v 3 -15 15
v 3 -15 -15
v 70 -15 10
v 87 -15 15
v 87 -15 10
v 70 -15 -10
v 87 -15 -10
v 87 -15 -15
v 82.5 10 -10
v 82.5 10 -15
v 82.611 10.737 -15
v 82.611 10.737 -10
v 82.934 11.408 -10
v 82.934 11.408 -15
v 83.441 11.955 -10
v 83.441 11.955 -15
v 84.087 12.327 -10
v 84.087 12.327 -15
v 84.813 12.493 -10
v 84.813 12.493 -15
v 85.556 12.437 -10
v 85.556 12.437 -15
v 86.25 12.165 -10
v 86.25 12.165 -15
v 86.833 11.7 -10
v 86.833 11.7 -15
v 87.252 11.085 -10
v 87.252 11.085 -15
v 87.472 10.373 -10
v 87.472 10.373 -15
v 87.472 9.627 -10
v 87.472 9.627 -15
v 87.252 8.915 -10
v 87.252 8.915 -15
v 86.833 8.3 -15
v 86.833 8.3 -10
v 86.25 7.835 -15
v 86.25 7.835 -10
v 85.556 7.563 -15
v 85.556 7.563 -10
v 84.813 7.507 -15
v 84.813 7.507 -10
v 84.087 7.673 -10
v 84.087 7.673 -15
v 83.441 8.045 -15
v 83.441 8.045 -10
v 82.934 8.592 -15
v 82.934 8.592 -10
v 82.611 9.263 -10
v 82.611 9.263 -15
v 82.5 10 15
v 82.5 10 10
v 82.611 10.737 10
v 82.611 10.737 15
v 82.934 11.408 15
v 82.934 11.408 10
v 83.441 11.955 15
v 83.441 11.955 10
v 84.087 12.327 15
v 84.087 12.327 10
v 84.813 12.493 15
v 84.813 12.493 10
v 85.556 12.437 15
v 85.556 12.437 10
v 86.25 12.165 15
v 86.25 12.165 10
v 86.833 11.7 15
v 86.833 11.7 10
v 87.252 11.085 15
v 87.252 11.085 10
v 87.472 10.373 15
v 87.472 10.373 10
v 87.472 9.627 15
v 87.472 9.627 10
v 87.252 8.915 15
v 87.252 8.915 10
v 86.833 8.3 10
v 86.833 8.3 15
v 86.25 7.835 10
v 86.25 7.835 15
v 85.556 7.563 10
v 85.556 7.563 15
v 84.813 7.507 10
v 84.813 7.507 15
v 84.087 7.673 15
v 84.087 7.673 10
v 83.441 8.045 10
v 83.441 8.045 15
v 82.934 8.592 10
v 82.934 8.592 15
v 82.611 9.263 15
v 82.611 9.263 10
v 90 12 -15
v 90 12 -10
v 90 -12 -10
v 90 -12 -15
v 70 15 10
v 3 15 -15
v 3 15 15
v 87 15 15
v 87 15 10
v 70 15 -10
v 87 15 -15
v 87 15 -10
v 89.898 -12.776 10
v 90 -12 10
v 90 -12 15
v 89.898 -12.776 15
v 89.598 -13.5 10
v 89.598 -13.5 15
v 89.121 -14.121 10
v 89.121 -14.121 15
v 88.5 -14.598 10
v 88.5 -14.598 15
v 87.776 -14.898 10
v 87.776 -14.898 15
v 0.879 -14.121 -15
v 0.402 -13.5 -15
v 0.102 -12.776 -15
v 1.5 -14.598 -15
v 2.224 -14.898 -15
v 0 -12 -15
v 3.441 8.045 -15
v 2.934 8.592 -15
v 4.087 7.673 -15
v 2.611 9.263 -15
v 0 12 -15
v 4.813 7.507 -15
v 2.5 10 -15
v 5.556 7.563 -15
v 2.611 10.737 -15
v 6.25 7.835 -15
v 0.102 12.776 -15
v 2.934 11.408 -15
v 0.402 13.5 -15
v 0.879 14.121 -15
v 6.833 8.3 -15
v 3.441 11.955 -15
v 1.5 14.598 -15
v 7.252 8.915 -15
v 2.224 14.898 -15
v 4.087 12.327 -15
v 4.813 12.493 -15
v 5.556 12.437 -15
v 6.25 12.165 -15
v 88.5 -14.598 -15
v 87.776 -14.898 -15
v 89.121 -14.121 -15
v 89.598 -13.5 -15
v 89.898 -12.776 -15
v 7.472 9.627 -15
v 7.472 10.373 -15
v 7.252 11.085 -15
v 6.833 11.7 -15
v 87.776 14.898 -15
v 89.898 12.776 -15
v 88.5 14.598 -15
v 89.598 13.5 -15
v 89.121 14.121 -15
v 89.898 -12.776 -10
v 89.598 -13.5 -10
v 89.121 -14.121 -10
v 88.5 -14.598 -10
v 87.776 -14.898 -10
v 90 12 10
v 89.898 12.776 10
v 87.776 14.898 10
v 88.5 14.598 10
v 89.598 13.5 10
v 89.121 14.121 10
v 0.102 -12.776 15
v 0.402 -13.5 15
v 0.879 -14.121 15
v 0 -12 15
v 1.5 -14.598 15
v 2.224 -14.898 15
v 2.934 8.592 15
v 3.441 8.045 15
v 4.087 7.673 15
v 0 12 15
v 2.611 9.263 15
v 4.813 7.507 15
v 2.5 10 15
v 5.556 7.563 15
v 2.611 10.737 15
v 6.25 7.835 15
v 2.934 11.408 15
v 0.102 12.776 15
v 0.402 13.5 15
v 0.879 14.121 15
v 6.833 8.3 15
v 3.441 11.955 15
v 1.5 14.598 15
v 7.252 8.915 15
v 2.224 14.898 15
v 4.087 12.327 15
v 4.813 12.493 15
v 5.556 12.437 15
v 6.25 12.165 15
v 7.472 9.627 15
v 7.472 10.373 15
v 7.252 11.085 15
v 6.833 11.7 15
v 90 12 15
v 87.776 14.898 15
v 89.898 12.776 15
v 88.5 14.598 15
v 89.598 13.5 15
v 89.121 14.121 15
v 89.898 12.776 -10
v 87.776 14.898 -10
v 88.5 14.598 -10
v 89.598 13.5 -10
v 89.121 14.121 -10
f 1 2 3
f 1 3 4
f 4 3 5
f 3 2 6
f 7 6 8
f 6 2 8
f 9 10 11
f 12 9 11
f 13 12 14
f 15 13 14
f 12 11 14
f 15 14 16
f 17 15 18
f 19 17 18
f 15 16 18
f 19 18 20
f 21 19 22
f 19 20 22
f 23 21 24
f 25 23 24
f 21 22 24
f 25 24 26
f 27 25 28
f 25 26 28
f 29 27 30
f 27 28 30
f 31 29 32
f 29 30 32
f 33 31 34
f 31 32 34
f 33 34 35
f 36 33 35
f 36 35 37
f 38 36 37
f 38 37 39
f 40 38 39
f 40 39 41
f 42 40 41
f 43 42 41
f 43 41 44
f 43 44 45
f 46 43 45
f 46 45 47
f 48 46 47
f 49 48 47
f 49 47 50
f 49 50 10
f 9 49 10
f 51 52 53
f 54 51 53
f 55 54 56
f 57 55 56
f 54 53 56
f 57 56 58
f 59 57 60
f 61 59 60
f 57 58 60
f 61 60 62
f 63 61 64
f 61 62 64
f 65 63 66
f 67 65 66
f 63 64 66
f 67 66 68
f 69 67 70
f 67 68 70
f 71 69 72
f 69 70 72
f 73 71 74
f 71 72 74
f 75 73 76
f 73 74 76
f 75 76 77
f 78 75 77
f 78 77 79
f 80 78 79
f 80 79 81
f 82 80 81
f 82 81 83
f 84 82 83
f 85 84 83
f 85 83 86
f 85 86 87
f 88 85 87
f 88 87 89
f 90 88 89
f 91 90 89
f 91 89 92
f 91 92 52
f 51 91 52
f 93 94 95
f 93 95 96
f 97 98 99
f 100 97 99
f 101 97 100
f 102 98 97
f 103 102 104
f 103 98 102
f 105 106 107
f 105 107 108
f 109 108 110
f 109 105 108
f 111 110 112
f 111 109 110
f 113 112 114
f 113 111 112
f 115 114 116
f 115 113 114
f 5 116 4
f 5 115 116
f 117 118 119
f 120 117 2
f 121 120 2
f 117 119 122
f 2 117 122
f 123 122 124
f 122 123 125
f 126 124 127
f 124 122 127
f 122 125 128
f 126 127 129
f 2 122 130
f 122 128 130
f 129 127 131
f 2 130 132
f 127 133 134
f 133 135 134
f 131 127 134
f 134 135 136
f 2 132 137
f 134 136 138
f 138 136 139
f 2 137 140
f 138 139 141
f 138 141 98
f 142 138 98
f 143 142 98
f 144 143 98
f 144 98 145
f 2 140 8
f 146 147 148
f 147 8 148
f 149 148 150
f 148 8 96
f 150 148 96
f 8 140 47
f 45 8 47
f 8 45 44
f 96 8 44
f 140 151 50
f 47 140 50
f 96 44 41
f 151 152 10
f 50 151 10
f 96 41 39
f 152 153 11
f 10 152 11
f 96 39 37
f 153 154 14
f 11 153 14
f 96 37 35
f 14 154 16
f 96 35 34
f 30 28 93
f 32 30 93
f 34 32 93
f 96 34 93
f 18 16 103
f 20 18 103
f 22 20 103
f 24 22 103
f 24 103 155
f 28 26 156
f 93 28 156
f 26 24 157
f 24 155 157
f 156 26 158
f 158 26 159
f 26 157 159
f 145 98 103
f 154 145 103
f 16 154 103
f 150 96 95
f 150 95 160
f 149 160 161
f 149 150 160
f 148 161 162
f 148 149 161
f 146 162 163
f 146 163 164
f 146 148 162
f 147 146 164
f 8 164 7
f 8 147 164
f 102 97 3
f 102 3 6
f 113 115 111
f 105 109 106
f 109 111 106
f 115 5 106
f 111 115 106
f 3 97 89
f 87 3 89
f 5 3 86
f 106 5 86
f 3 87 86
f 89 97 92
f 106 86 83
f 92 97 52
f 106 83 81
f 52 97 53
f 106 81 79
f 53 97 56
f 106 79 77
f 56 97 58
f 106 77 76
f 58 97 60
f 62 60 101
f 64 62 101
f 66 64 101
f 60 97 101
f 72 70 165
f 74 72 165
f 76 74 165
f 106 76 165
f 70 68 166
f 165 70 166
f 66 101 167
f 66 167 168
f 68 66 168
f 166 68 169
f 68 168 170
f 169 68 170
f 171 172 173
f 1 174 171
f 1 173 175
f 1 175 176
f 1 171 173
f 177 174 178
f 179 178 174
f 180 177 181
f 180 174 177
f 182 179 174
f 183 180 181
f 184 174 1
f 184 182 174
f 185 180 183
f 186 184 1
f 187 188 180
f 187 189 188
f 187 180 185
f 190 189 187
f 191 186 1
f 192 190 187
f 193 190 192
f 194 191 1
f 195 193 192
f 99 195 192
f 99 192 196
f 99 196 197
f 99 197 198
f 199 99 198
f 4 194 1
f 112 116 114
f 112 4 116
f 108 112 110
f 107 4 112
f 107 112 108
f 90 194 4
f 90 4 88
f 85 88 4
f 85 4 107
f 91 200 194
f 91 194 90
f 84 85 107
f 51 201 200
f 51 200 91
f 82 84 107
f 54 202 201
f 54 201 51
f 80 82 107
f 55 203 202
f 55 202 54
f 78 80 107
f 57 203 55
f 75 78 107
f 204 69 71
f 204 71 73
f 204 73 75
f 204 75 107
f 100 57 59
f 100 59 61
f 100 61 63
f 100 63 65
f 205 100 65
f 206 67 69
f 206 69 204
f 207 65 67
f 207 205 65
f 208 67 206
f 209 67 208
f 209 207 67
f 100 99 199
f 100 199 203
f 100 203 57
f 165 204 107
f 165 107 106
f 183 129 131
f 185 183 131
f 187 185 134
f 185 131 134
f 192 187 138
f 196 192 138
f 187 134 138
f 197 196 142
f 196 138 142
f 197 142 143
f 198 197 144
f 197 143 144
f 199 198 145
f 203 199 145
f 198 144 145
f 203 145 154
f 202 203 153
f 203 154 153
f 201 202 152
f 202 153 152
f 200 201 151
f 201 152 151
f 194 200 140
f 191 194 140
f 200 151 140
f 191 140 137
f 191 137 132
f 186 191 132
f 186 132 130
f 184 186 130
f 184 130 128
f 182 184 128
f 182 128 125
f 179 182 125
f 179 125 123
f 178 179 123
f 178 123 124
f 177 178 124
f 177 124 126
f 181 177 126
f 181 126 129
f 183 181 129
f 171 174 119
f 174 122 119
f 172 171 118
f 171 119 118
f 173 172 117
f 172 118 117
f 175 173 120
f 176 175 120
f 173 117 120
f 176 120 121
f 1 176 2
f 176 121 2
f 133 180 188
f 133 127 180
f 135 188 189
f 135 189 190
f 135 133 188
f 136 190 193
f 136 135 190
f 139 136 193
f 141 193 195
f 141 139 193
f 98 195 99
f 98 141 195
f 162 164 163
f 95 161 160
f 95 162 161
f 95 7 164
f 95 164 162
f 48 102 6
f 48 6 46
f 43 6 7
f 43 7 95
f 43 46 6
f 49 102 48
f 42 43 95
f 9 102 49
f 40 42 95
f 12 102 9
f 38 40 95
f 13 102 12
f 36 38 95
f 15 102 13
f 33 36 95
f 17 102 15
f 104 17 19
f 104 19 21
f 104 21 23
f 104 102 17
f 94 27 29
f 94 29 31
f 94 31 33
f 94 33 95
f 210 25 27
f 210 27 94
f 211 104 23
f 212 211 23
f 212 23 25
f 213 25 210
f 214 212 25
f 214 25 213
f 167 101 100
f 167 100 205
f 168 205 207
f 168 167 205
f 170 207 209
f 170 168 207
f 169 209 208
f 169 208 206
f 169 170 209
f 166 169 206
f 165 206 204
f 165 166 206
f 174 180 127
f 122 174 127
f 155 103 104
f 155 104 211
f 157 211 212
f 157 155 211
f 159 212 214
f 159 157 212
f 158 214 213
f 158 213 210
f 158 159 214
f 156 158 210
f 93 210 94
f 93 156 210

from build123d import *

# Parameters (mm, degrees)
ESQUISSE2_W             = 90
ESQUISSE2_H             = 30
BOSS_EXTRU_1_DEPTH      = 15
CONG_1_R                = 3
ESQUISSE4_W             = 20
ESQUISSE4_H             = 20
ENL_V_MAT_EXTRU_1_DEPTH = 31
ESQUISSE5_R             = 2.5
ENL_V_MAT_EXTRU_2_DEPTH = 31


with BuildPart() as part:
    # Esquisse2 → Boss.-Extru.1 (new body, symmetric)
    with BuildSketch(Plane(origin=(0, 0, 0), x_dir=(1, 0, 0), z_dir=(0, 1, 0))):
        with Locations((45, 0)):
            Rectangle(ESQUISSE2_W, ESQUISSE2_H)
    extrude(amount=BOSS_EXTRU_1_DEPTH, both=True)

    # Congé1
    cong_1_edges = [part.edges().sort_by_distance(p)[0] for p in [
        (90, 15, 0),
        (0, 15, 0),
        (90, -15, 0),
        (0, -15, 0),
    ]]
    fillet(cong_1_edges, radius=CONG_1_R)

    # Esquisse4 → Enlèv. mat.-Extru.1 (cut, through all)
    with BuildSketch(Plane(origin=(0, 15, 0), x_dir=(1, 0, 0), z_dir=(0, 1, 0))):
        with Locations((80, 0)):
            Rectangle(ESQUISSE4_W, ESQUISSE4_H)
    extrude(amount=-ENL_V_MAT_EXTRU_1_DEPTH, mode=Mode.SUBTRACT)

    # Esquisse5 → Enlèv. mat.-Extru.2 (cut, through all)
    with BuildSketch(Plane(origin=(0, 0, -15), x_dir=(-1, 0, 0), z_dir=(0, 0, -1))):
        with Locations((-85, 10)):
            Circle(ESQUISSE5_R)
        with Locations((-5, 10)):
            Circle(ESQUISSE5_R)
    extrude(amount=-ENL_V_MAT_EXTRU_2_DEPTH, mode=Mode.SUBTRACT)


solid = part.part
